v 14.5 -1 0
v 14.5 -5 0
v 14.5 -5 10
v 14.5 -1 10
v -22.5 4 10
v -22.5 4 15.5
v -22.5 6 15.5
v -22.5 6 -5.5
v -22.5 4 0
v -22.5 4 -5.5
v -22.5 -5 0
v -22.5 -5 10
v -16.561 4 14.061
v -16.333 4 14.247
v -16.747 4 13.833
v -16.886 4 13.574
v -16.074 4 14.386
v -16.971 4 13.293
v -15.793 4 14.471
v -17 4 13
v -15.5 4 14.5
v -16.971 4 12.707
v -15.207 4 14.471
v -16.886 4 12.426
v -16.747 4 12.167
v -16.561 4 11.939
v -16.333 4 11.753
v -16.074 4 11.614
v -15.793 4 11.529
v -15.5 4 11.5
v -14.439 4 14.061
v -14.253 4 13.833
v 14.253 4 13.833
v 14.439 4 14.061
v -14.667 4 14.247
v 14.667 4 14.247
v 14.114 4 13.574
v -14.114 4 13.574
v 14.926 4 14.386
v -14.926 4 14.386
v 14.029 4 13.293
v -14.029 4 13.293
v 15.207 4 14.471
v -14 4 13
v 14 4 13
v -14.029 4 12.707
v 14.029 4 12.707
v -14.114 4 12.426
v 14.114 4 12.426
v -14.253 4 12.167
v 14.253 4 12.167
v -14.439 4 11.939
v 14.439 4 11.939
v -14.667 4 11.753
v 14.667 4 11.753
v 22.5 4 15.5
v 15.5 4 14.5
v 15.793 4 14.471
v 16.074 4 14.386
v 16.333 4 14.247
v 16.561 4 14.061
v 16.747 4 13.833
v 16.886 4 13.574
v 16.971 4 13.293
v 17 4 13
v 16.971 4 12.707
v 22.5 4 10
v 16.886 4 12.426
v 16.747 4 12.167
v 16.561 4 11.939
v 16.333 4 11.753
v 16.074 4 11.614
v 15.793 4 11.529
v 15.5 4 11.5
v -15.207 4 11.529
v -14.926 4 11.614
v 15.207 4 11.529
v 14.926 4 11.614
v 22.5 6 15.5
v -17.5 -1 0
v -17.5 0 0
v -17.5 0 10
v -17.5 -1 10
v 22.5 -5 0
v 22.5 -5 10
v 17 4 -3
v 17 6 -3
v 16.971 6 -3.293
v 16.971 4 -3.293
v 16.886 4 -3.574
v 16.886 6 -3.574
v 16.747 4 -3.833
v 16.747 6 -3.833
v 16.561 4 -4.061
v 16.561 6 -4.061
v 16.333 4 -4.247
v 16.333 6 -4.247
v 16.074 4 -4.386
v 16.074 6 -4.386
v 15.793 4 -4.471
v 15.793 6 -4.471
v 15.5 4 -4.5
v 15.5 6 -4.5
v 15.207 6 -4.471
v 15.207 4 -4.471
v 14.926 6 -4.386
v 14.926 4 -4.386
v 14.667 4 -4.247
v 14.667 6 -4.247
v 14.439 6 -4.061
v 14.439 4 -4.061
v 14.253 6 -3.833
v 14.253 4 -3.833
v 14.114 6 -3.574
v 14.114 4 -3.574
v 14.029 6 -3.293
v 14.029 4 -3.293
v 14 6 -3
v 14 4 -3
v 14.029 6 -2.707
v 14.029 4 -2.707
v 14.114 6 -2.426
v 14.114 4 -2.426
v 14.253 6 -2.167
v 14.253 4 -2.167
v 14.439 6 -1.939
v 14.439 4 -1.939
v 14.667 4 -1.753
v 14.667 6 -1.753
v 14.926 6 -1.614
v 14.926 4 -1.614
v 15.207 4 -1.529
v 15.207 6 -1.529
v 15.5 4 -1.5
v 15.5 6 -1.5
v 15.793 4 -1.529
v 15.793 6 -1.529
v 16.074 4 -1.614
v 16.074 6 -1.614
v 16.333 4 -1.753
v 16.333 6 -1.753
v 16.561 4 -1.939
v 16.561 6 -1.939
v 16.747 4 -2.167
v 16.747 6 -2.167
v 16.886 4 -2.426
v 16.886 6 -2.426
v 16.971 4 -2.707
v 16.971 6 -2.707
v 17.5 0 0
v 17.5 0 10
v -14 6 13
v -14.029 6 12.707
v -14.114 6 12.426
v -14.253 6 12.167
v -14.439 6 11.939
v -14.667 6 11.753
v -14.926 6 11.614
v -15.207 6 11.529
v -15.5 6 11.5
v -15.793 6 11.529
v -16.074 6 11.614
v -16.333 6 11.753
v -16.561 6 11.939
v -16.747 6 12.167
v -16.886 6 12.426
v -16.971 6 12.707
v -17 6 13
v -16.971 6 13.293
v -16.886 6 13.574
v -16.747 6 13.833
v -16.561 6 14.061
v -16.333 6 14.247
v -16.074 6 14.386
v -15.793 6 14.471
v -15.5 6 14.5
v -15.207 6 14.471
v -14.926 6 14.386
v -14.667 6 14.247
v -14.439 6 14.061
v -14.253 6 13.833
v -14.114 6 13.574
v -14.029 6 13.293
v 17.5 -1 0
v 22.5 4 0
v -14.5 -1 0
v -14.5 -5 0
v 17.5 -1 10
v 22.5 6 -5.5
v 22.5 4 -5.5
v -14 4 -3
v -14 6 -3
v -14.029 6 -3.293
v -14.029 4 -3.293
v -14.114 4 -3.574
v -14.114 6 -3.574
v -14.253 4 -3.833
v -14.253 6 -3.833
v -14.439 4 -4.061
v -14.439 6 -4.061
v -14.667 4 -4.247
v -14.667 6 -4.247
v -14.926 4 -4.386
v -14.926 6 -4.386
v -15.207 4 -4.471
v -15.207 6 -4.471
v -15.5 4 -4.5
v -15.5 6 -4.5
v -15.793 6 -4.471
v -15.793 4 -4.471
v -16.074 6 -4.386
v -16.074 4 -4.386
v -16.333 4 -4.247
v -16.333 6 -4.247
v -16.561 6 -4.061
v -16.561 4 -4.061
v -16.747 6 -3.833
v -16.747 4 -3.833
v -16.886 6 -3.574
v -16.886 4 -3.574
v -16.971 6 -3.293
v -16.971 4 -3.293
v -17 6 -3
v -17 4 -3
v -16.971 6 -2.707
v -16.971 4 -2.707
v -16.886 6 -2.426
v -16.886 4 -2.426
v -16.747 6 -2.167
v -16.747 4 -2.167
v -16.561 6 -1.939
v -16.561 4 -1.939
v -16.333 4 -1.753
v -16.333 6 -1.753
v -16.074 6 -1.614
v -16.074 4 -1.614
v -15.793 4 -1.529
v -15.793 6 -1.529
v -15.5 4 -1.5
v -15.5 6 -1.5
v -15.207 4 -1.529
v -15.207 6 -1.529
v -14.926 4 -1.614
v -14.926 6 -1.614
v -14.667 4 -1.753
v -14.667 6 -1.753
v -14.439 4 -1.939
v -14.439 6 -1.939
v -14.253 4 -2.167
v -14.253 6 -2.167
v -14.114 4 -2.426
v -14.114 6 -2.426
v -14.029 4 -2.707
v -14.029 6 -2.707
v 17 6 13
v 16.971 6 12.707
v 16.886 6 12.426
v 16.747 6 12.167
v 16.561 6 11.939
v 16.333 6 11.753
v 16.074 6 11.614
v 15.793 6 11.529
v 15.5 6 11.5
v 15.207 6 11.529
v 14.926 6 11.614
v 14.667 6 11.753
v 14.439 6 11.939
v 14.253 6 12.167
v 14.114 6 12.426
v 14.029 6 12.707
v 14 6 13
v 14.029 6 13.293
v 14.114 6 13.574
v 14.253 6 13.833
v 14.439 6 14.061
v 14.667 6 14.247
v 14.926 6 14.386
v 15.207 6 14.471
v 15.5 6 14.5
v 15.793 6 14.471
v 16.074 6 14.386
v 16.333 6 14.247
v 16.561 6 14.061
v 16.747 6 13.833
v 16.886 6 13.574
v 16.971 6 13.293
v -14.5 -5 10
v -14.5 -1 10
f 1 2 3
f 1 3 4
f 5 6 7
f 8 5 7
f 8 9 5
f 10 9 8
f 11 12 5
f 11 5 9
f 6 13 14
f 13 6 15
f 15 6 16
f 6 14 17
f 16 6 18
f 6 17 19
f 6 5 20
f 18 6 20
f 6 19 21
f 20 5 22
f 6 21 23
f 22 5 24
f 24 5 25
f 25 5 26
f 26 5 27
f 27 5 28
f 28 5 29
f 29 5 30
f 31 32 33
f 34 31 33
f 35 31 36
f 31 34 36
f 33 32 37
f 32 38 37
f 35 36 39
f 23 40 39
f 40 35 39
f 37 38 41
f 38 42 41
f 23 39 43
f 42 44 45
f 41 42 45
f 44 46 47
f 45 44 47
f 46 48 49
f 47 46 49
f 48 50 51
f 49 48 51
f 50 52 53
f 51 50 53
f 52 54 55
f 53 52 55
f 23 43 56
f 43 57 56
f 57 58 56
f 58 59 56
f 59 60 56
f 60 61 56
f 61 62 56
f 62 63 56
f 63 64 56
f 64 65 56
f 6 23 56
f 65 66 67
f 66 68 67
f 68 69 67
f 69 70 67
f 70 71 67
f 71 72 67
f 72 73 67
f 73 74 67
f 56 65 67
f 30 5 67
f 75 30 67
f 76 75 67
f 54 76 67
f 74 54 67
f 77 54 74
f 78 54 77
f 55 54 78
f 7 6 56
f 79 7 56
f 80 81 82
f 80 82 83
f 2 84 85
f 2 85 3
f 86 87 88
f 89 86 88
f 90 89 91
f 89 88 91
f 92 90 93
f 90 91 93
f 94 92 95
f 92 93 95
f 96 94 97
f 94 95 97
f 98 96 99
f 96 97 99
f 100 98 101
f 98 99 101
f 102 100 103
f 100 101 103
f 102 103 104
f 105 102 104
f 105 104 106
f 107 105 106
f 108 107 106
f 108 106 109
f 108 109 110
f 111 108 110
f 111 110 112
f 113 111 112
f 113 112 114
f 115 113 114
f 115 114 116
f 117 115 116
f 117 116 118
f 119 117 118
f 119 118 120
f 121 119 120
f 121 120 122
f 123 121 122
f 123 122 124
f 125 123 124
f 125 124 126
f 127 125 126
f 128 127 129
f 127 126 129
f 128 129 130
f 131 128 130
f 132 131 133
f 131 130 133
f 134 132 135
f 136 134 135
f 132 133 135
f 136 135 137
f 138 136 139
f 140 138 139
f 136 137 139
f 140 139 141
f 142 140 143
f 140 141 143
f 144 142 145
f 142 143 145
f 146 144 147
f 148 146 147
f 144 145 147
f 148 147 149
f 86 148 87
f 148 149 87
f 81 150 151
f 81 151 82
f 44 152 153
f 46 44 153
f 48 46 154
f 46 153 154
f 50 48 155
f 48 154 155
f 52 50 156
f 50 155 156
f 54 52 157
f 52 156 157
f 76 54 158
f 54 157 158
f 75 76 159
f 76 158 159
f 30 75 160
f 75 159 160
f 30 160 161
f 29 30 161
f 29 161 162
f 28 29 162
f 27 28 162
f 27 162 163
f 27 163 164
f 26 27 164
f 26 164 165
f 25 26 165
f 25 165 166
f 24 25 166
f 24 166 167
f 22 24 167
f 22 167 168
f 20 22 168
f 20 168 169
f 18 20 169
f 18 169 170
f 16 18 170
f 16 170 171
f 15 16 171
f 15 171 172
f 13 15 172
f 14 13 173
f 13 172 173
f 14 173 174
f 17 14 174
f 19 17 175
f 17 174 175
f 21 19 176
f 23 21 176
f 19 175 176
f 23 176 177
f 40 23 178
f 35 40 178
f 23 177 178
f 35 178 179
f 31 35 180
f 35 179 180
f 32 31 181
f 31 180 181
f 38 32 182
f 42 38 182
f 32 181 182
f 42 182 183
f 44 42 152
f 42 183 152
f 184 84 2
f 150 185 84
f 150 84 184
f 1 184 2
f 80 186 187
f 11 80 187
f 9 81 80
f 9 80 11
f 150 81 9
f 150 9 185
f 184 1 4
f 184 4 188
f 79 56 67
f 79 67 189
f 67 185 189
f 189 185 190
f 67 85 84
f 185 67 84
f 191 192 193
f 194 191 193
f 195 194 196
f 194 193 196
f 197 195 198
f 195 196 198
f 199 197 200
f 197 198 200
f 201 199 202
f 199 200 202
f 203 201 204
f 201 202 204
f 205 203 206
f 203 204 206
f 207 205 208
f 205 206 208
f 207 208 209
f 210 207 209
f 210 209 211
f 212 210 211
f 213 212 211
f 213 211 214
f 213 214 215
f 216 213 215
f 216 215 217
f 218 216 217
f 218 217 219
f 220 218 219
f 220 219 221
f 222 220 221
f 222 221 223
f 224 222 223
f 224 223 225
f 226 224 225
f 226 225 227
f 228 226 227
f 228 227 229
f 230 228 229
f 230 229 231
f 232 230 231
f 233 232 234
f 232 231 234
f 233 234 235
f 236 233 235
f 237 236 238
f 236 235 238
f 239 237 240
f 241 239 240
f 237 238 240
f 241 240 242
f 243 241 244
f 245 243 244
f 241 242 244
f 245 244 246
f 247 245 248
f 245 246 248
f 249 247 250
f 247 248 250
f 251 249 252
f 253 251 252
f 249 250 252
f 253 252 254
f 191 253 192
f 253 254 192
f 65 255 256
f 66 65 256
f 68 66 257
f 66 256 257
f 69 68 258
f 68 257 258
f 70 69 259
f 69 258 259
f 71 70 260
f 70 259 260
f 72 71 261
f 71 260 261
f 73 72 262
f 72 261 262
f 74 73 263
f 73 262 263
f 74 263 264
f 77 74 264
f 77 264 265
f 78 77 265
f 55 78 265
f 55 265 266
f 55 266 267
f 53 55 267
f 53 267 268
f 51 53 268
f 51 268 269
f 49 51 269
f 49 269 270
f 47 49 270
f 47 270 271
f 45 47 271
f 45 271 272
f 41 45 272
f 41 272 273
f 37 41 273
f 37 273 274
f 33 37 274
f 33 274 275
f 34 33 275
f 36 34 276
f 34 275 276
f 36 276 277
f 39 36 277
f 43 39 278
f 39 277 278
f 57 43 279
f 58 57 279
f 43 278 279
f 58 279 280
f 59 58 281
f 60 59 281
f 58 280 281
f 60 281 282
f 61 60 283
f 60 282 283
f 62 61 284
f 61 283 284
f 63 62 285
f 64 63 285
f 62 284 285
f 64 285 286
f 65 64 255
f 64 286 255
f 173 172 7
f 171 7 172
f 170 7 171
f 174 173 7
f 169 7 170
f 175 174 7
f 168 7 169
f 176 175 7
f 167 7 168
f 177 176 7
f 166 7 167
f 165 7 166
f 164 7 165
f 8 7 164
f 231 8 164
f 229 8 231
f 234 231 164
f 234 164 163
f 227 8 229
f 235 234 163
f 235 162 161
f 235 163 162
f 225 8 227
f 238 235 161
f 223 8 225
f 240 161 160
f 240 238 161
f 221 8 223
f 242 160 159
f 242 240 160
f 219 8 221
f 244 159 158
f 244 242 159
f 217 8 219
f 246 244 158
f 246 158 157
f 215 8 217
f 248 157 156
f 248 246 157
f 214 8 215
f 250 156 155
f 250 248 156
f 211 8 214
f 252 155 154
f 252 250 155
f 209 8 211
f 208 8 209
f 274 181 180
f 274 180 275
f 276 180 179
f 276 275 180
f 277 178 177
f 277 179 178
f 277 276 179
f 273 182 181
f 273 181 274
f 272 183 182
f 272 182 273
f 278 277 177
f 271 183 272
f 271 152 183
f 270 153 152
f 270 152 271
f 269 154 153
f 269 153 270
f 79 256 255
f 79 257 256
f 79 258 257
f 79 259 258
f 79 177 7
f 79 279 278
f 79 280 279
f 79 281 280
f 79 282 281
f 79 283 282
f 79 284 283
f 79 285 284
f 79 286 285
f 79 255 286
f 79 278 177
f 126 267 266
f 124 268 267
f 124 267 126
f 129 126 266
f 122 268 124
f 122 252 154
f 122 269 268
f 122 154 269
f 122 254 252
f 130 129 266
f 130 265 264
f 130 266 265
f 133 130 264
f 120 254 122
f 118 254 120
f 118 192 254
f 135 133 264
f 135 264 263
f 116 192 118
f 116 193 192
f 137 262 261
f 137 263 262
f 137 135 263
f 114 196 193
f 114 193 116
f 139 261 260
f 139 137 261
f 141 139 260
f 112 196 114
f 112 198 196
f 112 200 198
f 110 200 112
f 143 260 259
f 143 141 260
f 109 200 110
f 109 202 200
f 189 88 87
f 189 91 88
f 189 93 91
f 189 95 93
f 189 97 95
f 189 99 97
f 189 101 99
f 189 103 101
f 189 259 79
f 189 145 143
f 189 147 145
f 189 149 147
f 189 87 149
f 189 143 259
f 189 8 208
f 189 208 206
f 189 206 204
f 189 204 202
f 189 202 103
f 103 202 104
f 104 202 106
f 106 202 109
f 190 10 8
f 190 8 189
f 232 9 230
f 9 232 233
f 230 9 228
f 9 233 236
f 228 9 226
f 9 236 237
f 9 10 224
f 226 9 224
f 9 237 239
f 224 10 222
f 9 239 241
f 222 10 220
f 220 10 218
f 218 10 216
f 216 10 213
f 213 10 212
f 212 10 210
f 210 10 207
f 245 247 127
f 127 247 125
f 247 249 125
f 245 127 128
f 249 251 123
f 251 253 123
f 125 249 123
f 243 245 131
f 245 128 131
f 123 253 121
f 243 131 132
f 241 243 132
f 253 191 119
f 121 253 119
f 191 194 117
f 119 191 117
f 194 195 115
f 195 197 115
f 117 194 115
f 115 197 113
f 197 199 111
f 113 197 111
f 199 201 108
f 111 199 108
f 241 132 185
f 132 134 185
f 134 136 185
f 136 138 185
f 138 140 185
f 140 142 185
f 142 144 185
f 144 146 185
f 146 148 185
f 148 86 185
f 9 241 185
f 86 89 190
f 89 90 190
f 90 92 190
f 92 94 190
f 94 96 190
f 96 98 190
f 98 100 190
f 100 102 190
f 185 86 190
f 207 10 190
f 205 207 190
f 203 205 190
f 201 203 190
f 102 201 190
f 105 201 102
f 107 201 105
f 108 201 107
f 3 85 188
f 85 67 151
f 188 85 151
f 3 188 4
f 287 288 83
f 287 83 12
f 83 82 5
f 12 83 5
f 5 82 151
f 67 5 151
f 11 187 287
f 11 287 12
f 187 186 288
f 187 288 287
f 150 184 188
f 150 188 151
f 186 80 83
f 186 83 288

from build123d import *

# Parameters (mm, degrees)
BOSS_EXTRUDE1_DEPTH = 10
SKETCH3_W           = 45
SKETCH3_H           = 21
BOSS_EXTRUDE2_DEPTH = 2
SKETCH4_R           = 1.5
CUT_EXTRUDE1_DEPTH  = 5


with BuildPart() as part:
    # Sketch2 → Boss-Extrude1 (new body)
    with BuildSketch(Plane.XY):
        Polygon((-17.5, 0), (-17.5, -1), (-14.5, -1), (-14.5, -5), (-22.5, -5), (-22.5, 0), (-22.5, 4), (22.5, 4), (22.5, -5), (14.5, -5), (14.5, -1), (17.5, -1), (17.5, 0), align=None)
    extrude(amount=BOSS_EXTRUDE1_DEPTH)

    # Sketch3 → Boss-Extrude2 (add)
    with BuildSketch(Plane(origin=(0, 4, 0), x_dir=(1, 0, 0), z_dir=(0, 1, 0))):
        with Locations((0, -5)):
            Rectangle(SKETCH3_W, SKETCH3_H)
    extrude(amount=BOSS_EXTRUDE2_DEPTH)

    # Sketch4 → Cut-Extrude1 (cut)
    with BuildSketch(Plane(origin=(0, 6, 0), x_dir=(1, 0, 0), z_dir=(0, 1, 0))):
        with Locations((-15.5, -13)):
            Circle(SKETCH4_R)
        with Locations((-15.5, 3)):
            Circle(SKETCH4_R)
        with Locations((15.5, 3)):
            Circle(SKETCH4_R)
        with Locations((15.5, -13)):
            Circle(SKETCH4_R)
    extrude(amount=-CUT_EXTRUDE1_DEPTH, mode=Mode.SUBTRACT)


solid = part.part
